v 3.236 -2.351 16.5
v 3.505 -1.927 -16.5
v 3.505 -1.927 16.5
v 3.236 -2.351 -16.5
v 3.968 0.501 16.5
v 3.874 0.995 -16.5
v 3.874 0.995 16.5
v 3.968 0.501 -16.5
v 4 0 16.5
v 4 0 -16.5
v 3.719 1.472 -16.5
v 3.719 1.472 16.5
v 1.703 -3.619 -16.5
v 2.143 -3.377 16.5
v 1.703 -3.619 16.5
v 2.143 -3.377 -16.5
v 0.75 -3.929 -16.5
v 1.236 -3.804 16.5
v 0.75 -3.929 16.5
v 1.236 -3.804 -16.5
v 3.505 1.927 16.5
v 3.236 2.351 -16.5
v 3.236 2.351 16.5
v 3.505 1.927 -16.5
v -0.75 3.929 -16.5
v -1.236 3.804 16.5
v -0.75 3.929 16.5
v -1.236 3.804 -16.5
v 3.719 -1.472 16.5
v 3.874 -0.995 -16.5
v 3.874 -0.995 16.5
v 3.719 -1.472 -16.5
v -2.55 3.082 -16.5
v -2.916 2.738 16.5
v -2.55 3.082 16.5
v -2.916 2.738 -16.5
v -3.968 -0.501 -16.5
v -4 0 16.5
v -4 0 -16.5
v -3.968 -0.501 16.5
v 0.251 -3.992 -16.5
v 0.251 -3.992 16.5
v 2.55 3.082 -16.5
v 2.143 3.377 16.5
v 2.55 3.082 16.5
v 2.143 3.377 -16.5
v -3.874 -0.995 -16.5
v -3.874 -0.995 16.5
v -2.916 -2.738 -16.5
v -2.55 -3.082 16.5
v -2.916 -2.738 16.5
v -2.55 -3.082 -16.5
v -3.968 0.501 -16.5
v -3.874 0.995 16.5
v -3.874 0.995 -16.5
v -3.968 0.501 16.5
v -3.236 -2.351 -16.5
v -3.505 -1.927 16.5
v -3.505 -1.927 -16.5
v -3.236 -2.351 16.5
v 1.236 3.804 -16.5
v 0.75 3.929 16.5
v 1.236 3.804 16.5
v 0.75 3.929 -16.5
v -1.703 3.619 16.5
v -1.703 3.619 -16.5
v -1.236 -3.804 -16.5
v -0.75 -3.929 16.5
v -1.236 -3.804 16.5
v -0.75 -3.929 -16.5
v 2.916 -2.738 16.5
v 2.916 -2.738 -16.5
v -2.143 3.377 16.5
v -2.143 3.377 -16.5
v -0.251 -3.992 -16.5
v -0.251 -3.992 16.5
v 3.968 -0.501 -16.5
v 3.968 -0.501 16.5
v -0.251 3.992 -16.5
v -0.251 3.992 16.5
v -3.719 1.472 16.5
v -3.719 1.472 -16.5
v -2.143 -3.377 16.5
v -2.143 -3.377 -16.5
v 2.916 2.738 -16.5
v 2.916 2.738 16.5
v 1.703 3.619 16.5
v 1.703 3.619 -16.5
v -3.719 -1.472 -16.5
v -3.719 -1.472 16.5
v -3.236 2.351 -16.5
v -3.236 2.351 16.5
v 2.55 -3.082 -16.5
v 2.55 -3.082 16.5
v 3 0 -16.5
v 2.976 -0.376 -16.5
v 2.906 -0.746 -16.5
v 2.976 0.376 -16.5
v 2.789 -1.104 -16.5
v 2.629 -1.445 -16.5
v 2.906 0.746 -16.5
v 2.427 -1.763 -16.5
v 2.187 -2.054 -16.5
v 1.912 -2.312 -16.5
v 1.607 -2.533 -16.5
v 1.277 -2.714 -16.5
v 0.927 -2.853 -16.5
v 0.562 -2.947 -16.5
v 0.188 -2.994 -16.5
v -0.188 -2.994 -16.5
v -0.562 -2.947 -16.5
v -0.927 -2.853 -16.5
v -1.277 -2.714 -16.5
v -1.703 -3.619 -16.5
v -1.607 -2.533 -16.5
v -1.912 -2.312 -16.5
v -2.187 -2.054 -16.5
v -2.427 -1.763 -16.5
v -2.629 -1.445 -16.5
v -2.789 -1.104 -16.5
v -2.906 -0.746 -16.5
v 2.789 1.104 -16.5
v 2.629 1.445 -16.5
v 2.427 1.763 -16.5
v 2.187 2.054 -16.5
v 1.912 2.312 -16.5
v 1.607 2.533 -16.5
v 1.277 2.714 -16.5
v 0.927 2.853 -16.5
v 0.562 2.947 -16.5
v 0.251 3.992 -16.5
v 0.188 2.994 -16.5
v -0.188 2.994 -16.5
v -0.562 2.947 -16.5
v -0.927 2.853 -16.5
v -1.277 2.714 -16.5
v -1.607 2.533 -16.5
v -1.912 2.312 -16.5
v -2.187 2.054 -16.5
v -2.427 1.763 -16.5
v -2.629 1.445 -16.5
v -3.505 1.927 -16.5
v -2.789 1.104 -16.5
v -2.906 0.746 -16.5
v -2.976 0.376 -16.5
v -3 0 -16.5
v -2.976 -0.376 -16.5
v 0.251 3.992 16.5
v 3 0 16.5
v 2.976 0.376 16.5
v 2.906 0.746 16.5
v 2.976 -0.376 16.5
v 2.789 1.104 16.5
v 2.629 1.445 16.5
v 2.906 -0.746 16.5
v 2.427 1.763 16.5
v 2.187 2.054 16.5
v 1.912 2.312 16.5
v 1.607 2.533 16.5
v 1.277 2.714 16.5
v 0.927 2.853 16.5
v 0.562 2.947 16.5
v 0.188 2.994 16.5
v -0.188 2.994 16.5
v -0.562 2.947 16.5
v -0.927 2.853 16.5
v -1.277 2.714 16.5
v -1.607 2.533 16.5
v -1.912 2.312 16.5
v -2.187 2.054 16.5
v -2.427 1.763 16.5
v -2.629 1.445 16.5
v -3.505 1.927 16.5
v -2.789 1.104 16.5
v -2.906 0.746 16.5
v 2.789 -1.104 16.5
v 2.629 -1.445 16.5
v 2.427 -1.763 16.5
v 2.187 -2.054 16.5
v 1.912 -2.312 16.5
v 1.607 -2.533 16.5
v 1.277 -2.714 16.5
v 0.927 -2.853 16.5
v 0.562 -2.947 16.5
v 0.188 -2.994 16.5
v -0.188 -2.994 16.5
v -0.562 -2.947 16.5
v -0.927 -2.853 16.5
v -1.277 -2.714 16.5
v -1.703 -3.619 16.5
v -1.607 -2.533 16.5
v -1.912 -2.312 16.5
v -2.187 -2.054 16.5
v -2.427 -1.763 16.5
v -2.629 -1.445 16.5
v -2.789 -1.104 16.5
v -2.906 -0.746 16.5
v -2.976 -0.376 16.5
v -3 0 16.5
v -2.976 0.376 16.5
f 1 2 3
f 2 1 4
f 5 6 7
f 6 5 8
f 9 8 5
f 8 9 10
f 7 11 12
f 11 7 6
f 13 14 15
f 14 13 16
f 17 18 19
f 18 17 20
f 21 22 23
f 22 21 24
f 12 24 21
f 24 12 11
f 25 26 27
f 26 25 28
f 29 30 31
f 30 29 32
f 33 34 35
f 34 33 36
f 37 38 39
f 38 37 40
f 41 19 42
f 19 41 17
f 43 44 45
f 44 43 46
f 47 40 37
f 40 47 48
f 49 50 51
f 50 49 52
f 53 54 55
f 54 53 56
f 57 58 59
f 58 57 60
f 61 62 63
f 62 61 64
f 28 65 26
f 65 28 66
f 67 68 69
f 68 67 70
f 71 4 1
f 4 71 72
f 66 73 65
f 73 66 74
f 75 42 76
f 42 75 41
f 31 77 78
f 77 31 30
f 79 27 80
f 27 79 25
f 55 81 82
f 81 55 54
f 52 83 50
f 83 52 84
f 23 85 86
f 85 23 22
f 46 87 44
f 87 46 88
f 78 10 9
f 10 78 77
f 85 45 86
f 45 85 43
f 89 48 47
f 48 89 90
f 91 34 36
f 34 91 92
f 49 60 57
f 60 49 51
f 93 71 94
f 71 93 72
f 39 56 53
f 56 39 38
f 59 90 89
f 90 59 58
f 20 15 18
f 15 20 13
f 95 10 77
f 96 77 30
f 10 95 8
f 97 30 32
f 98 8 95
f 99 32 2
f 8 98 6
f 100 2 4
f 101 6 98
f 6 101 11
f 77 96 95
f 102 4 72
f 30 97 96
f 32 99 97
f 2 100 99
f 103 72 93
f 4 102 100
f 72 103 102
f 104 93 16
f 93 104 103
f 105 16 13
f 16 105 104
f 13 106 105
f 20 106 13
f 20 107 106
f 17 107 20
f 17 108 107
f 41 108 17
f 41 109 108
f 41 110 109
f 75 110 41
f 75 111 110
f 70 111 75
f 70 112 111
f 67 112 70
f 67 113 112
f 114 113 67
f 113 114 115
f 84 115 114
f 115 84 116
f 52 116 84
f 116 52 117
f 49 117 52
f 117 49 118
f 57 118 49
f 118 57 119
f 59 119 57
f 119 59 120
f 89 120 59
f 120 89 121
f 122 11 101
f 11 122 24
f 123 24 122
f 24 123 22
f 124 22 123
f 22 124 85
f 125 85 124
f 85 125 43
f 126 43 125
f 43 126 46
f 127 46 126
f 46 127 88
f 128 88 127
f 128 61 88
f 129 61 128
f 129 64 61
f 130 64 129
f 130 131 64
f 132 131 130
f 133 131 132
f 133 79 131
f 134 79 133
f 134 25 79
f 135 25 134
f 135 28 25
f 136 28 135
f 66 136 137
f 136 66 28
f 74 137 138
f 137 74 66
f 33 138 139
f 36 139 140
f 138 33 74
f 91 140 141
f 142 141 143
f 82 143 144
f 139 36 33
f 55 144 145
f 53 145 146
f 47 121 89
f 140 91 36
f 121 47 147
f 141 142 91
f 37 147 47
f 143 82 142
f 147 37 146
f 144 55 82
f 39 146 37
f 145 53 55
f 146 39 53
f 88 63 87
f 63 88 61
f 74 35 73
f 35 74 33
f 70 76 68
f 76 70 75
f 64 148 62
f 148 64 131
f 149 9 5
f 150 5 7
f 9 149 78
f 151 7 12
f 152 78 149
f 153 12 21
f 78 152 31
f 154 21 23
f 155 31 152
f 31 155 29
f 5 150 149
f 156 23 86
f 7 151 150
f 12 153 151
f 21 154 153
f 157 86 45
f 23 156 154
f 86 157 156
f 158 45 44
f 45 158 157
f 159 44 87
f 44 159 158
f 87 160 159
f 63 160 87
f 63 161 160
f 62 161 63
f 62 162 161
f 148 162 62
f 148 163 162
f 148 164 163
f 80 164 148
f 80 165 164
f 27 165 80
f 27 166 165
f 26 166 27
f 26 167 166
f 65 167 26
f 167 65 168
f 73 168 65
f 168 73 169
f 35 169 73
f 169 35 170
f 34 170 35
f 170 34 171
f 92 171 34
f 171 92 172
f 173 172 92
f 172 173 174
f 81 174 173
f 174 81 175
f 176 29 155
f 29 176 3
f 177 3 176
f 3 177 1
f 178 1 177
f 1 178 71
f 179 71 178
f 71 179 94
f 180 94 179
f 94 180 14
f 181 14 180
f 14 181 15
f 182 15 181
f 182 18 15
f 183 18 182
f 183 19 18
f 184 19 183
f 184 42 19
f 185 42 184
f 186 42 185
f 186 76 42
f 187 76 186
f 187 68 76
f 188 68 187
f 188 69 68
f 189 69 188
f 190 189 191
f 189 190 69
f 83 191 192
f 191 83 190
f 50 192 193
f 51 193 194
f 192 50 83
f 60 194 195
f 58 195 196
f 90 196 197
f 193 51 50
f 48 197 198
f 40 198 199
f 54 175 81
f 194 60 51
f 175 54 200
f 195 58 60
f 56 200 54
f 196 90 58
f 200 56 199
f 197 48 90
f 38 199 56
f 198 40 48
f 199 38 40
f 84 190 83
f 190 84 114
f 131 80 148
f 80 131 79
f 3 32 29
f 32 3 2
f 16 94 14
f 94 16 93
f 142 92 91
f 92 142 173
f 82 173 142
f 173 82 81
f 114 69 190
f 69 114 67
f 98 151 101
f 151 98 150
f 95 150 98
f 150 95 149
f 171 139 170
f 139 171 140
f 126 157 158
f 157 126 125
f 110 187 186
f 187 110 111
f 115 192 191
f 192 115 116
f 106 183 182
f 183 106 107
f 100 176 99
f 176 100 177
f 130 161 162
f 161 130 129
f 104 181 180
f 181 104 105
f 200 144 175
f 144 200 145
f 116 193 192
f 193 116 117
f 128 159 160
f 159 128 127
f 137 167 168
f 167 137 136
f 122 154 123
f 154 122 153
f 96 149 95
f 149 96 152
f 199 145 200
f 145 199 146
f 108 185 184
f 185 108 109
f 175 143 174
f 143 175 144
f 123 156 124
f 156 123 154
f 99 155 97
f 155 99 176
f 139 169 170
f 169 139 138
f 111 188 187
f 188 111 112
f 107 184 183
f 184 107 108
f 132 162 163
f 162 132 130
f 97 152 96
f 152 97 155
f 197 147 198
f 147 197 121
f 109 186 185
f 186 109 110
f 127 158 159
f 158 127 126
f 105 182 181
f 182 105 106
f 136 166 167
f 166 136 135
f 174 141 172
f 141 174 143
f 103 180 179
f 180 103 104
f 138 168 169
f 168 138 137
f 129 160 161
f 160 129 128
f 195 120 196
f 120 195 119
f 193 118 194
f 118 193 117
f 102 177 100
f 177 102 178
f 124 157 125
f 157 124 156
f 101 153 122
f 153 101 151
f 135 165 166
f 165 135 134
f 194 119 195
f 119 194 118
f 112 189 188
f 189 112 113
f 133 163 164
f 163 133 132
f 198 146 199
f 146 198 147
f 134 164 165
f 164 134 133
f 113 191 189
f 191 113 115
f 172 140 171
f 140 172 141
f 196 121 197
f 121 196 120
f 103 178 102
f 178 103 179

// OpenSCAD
$fn = 50;


difference() {
	union() {
		translate(v = [0, 0, -16.5000000000]) {
			cylinder(h = 33, r = 4.0000000000);
		}
	}
	union() {
		translate(v = [0, 0, -100.0000000000]) {
			cylinder(h = 200, r = 3.0000000000);
		}
	}
}
